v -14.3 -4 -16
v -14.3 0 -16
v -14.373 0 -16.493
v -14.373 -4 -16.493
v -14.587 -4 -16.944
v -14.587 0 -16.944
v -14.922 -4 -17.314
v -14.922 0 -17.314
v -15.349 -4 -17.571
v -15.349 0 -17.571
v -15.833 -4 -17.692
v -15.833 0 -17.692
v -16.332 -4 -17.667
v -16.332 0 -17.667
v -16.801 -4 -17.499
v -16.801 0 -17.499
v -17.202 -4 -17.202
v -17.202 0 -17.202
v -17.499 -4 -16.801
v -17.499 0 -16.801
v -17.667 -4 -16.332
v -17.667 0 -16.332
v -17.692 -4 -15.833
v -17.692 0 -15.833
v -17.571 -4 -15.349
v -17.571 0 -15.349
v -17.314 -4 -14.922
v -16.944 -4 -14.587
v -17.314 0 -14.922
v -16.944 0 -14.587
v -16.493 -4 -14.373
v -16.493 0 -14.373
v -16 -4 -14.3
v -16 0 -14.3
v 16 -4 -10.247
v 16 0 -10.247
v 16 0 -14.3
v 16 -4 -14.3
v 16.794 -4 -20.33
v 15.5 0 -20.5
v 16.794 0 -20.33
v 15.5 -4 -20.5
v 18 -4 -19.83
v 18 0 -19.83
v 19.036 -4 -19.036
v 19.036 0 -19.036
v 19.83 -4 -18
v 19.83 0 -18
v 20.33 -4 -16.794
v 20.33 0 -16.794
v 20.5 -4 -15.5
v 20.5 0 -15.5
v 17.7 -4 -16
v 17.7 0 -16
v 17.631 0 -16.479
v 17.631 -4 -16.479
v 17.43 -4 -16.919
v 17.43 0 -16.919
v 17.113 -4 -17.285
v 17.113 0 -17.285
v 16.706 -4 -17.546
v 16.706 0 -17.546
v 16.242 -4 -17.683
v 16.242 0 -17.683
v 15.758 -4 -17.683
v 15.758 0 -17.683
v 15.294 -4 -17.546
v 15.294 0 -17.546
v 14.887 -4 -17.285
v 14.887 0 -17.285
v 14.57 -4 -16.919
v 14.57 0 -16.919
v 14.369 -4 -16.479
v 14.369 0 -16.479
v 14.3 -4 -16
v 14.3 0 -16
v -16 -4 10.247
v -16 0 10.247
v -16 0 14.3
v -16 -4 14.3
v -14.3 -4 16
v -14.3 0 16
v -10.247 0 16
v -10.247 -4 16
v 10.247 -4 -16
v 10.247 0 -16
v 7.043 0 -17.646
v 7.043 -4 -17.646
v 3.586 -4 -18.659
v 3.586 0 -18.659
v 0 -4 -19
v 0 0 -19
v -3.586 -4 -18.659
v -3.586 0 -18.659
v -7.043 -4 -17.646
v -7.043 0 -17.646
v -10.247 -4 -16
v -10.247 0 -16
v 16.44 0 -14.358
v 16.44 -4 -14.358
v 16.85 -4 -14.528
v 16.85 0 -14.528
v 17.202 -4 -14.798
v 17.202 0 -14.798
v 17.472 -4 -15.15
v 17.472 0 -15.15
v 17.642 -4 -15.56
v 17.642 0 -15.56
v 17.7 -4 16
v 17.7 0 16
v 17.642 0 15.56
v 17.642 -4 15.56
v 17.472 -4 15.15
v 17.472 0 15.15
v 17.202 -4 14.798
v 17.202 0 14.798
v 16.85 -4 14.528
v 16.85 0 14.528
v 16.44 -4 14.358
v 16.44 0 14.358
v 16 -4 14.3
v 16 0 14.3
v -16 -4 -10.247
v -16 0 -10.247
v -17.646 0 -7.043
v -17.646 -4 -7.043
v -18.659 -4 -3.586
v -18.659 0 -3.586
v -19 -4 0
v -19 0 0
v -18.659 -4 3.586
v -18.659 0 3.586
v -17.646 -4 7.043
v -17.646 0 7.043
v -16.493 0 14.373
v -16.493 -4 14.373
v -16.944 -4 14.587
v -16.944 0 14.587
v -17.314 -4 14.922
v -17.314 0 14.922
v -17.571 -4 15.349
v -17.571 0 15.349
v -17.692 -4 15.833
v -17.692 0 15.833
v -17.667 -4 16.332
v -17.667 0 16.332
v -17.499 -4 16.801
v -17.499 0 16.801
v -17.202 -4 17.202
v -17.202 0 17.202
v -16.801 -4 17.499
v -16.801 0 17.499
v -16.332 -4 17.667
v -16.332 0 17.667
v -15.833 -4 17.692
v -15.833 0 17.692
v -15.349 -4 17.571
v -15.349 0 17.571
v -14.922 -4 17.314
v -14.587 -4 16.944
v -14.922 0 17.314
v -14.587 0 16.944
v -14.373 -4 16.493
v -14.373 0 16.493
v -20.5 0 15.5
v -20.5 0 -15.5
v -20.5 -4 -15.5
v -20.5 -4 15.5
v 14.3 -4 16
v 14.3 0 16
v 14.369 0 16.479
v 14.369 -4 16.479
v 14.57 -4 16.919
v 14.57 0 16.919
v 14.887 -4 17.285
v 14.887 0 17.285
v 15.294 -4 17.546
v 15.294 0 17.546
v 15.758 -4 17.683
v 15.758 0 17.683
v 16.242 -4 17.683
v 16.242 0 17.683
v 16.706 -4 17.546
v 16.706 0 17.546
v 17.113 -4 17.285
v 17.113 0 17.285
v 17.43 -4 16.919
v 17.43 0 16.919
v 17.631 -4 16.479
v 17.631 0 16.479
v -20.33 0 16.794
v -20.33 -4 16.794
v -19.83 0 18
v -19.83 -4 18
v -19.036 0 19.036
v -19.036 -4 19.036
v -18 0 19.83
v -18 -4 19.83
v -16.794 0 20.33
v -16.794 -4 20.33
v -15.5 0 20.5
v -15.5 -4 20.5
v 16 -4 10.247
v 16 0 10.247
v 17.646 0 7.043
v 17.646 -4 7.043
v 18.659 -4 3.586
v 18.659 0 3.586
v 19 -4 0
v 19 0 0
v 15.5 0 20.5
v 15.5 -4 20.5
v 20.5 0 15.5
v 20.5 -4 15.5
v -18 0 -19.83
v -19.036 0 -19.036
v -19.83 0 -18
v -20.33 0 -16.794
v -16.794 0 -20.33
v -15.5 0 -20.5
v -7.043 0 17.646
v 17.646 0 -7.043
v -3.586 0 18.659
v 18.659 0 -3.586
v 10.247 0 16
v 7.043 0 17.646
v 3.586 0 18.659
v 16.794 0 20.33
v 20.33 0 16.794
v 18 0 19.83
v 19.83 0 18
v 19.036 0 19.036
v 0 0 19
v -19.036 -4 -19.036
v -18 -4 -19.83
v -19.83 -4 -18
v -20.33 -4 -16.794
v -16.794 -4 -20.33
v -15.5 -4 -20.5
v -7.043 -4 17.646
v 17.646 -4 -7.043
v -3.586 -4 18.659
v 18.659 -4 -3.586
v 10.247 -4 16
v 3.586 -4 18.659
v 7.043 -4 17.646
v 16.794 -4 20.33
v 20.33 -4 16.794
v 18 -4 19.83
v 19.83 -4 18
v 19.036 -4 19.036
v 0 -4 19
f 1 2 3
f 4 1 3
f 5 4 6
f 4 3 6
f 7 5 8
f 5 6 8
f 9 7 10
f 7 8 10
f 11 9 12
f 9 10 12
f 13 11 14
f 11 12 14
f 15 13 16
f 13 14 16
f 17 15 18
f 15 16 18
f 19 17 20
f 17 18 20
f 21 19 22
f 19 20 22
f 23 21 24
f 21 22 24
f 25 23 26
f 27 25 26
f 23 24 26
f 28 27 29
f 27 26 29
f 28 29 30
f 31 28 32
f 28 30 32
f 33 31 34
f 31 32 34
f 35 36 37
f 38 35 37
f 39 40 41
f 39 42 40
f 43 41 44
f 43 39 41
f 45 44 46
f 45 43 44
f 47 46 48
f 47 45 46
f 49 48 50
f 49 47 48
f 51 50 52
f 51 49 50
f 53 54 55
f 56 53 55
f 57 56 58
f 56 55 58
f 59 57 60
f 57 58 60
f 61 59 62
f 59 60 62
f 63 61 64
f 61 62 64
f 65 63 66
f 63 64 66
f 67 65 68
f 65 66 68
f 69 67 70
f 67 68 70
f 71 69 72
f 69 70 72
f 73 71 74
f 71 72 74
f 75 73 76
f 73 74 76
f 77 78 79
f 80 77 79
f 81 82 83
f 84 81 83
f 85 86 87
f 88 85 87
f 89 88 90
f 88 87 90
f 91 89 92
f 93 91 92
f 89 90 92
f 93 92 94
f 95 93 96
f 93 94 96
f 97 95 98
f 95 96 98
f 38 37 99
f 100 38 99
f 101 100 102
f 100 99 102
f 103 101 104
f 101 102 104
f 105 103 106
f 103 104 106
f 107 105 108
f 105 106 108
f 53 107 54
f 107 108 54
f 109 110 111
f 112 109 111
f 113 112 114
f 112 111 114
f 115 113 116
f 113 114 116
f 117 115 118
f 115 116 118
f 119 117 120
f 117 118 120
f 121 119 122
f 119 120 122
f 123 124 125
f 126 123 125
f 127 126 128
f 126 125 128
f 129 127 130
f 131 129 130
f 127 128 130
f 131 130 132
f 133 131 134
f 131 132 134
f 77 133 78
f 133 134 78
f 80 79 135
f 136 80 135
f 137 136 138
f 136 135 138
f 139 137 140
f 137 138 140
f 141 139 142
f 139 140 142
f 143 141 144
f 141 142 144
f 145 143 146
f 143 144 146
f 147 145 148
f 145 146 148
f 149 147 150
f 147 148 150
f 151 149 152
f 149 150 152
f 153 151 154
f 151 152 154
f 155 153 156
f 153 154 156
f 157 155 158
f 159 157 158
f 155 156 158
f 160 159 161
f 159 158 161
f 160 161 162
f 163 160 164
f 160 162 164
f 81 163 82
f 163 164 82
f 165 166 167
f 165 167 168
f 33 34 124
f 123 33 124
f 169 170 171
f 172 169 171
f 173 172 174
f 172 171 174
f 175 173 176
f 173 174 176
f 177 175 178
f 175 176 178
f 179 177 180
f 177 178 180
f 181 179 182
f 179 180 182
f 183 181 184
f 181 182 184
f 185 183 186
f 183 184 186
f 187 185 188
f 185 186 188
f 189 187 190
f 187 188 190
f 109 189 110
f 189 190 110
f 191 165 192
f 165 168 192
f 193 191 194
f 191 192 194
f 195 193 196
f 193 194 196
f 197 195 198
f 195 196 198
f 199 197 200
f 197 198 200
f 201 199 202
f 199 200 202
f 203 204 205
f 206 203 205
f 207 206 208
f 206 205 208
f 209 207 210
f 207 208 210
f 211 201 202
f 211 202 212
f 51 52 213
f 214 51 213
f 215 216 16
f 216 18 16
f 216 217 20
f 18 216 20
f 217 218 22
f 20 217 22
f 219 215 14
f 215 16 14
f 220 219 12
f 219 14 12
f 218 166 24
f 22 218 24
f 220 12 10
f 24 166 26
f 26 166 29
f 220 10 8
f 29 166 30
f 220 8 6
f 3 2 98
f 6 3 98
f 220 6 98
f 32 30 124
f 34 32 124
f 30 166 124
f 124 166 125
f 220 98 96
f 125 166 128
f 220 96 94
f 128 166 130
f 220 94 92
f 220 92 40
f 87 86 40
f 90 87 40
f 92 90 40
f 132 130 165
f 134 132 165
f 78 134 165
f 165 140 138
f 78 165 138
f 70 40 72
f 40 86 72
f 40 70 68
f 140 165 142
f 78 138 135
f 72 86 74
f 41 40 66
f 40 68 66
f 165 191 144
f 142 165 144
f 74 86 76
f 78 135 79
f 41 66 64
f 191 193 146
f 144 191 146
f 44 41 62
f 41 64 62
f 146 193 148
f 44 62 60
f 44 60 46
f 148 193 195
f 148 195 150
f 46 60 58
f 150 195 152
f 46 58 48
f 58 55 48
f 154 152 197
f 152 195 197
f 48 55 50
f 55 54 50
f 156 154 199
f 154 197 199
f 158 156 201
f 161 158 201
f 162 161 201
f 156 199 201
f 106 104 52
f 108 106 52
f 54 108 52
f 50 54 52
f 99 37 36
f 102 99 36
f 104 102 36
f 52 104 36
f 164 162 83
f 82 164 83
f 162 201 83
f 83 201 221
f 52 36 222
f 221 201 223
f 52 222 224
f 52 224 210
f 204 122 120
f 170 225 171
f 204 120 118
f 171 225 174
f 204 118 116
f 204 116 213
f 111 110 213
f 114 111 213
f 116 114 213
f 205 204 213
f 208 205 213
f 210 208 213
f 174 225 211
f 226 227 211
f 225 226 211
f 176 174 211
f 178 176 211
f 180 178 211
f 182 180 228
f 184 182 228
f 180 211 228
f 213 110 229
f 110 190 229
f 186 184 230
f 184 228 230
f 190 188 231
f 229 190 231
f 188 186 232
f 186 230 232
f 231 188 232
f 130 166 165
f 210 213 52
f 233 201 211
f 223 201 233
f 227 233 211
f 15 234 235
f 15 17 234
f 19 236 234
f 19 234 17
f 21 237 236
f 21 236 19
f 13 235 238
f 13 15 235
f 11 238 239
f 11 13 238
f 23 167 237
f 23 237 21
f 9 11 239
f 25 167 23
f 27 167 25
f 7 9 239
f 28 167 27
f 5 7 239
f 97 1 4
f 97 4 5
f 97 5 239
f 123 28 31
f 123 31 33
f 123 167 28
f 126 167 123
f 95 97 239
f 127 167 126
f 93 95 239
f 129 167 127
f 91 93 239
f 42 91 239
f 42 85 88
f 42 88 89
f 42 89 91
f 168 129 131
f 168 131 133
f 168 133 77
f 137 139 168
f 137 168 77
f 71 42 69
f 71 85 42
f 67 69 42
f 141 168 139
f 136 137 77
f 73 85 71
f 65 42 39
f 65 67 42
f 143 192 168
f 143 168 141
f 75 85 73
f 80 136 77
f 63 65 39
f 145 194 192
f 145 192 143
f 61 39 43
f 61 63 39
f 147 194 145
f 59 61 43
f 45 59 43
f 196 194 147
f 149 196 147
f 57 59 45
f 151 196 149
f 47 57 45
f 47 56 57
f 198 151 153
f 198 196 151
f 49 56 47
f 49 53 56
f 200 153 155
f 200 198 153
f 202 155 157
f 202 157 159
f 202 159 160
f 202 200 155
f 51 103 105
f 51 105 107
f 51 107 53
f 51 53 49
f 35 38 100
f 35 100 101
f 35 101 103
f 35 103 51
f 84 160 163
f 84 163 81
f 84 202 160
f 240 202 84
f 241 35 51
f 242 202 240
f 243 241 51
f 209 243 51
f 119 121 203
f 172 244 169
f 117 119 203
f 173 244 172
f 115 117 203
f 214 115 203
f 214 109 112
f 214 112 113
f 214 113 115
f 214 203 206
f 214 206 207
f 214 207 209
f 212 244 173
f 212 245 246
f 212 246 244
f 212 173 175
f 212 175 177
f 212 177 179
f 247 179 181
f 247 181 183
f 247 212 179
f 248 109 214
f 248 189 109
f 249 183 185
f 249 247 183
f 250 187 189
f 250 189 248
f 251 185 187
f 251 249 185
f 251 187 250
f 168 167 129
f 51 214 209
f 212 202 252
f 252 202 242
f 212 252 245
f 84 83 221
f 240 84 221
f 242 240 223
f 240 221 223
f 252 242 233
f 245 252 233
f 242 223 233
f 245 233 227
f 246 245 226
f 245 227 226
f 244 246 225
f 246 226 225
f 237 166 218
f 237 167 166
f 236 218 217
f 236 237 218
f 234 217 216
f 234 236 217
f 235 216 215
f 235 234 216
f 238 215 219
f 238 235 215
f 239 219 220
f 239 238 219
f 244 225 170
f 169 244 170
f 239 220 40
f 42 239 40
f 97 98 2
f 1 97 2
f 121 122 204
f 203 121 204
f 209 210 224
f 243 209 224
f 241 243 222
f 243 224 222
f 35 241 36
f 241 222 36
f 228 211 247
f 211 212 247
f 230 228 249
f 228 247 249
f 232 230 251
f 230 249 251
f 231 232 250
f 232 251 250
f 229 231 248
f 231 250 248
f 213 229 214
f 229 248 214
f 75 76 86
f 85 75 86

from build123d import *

# Parameters (mm, degrees)
F0_W     = 41
F0_H     = 41
F1_DEPTH = 4
F2_R     = 5


with BuildPart() as f1:
    # F0 (on Front) → F1 (new body)
    with BuildSketch(Plane.XZ):
        Rectangle(F0_W, F0_H)
        with BuildLine():
            ThreePointArc((-16, 14.3), (-17.202082, 17.202082), (-14.3, 16))
            Line((-14.3, 16), (-10.246951, 16))
            ThreePointArc((-10.246951, 16), (0, 19), (10.246951, 16))
            Line((10.246951, 16), (14.3, 16))
            ThreePointArc((14.3, 16), (16, 17.7), (17.7, 16))
            ThreePointArc((17.7, 16), (17.202082, 14.797918), (16, 14.3))
            Line((16, 14.3), (16, 10.246951))
            ThreePointArc((16, 10.246951), (18.234583, 5.338539), (19, 0))
            ThreePointArc((19, 0), (18.234583, -5.338539), (16, -10.246951))
            Line((16, -10.246951), (16, -14.3))
            ThreePointArc((16, -14.3), (17.202082, -14.797918), (17.7, -16))
            ThreePointArc((17.7, -16), (16, -17.7), (14.3, -16))
            Line((14.3, -16), (10.246951, -16))
            ThreePointArc((10.246951, -16), (0, -19), (-10.246951, -16))
            Line((-10.246951, -16), (-14.3, -16))
            ThreePointArc((-14.3, -16), (-17.202082, -17.202082), (-16, -14.3))
            Line((-16, -14.3), (-16, -10.246951))
            ThreePointArc((-16, -10.246951), (-19, 0), (-16, 10.246951))
            Line((-16, 10.246951), (-16, 14.3))
        make_face(mode=Mode.SUBTRACT)
    extrude(amount=F1_DEPTH)

    # F2
    f2_edges = [f1.edges().sort_by_distance(p)[0] for p in [
        (-20.5, -2, -20.5),
        (20.5, -2, -20.5),
        (20.5, -2, 20.5),
        (-20.5, -2, 20.5),
    ]]
    fillet(f2_edges, radius=F2_R)


solid = f1.part
